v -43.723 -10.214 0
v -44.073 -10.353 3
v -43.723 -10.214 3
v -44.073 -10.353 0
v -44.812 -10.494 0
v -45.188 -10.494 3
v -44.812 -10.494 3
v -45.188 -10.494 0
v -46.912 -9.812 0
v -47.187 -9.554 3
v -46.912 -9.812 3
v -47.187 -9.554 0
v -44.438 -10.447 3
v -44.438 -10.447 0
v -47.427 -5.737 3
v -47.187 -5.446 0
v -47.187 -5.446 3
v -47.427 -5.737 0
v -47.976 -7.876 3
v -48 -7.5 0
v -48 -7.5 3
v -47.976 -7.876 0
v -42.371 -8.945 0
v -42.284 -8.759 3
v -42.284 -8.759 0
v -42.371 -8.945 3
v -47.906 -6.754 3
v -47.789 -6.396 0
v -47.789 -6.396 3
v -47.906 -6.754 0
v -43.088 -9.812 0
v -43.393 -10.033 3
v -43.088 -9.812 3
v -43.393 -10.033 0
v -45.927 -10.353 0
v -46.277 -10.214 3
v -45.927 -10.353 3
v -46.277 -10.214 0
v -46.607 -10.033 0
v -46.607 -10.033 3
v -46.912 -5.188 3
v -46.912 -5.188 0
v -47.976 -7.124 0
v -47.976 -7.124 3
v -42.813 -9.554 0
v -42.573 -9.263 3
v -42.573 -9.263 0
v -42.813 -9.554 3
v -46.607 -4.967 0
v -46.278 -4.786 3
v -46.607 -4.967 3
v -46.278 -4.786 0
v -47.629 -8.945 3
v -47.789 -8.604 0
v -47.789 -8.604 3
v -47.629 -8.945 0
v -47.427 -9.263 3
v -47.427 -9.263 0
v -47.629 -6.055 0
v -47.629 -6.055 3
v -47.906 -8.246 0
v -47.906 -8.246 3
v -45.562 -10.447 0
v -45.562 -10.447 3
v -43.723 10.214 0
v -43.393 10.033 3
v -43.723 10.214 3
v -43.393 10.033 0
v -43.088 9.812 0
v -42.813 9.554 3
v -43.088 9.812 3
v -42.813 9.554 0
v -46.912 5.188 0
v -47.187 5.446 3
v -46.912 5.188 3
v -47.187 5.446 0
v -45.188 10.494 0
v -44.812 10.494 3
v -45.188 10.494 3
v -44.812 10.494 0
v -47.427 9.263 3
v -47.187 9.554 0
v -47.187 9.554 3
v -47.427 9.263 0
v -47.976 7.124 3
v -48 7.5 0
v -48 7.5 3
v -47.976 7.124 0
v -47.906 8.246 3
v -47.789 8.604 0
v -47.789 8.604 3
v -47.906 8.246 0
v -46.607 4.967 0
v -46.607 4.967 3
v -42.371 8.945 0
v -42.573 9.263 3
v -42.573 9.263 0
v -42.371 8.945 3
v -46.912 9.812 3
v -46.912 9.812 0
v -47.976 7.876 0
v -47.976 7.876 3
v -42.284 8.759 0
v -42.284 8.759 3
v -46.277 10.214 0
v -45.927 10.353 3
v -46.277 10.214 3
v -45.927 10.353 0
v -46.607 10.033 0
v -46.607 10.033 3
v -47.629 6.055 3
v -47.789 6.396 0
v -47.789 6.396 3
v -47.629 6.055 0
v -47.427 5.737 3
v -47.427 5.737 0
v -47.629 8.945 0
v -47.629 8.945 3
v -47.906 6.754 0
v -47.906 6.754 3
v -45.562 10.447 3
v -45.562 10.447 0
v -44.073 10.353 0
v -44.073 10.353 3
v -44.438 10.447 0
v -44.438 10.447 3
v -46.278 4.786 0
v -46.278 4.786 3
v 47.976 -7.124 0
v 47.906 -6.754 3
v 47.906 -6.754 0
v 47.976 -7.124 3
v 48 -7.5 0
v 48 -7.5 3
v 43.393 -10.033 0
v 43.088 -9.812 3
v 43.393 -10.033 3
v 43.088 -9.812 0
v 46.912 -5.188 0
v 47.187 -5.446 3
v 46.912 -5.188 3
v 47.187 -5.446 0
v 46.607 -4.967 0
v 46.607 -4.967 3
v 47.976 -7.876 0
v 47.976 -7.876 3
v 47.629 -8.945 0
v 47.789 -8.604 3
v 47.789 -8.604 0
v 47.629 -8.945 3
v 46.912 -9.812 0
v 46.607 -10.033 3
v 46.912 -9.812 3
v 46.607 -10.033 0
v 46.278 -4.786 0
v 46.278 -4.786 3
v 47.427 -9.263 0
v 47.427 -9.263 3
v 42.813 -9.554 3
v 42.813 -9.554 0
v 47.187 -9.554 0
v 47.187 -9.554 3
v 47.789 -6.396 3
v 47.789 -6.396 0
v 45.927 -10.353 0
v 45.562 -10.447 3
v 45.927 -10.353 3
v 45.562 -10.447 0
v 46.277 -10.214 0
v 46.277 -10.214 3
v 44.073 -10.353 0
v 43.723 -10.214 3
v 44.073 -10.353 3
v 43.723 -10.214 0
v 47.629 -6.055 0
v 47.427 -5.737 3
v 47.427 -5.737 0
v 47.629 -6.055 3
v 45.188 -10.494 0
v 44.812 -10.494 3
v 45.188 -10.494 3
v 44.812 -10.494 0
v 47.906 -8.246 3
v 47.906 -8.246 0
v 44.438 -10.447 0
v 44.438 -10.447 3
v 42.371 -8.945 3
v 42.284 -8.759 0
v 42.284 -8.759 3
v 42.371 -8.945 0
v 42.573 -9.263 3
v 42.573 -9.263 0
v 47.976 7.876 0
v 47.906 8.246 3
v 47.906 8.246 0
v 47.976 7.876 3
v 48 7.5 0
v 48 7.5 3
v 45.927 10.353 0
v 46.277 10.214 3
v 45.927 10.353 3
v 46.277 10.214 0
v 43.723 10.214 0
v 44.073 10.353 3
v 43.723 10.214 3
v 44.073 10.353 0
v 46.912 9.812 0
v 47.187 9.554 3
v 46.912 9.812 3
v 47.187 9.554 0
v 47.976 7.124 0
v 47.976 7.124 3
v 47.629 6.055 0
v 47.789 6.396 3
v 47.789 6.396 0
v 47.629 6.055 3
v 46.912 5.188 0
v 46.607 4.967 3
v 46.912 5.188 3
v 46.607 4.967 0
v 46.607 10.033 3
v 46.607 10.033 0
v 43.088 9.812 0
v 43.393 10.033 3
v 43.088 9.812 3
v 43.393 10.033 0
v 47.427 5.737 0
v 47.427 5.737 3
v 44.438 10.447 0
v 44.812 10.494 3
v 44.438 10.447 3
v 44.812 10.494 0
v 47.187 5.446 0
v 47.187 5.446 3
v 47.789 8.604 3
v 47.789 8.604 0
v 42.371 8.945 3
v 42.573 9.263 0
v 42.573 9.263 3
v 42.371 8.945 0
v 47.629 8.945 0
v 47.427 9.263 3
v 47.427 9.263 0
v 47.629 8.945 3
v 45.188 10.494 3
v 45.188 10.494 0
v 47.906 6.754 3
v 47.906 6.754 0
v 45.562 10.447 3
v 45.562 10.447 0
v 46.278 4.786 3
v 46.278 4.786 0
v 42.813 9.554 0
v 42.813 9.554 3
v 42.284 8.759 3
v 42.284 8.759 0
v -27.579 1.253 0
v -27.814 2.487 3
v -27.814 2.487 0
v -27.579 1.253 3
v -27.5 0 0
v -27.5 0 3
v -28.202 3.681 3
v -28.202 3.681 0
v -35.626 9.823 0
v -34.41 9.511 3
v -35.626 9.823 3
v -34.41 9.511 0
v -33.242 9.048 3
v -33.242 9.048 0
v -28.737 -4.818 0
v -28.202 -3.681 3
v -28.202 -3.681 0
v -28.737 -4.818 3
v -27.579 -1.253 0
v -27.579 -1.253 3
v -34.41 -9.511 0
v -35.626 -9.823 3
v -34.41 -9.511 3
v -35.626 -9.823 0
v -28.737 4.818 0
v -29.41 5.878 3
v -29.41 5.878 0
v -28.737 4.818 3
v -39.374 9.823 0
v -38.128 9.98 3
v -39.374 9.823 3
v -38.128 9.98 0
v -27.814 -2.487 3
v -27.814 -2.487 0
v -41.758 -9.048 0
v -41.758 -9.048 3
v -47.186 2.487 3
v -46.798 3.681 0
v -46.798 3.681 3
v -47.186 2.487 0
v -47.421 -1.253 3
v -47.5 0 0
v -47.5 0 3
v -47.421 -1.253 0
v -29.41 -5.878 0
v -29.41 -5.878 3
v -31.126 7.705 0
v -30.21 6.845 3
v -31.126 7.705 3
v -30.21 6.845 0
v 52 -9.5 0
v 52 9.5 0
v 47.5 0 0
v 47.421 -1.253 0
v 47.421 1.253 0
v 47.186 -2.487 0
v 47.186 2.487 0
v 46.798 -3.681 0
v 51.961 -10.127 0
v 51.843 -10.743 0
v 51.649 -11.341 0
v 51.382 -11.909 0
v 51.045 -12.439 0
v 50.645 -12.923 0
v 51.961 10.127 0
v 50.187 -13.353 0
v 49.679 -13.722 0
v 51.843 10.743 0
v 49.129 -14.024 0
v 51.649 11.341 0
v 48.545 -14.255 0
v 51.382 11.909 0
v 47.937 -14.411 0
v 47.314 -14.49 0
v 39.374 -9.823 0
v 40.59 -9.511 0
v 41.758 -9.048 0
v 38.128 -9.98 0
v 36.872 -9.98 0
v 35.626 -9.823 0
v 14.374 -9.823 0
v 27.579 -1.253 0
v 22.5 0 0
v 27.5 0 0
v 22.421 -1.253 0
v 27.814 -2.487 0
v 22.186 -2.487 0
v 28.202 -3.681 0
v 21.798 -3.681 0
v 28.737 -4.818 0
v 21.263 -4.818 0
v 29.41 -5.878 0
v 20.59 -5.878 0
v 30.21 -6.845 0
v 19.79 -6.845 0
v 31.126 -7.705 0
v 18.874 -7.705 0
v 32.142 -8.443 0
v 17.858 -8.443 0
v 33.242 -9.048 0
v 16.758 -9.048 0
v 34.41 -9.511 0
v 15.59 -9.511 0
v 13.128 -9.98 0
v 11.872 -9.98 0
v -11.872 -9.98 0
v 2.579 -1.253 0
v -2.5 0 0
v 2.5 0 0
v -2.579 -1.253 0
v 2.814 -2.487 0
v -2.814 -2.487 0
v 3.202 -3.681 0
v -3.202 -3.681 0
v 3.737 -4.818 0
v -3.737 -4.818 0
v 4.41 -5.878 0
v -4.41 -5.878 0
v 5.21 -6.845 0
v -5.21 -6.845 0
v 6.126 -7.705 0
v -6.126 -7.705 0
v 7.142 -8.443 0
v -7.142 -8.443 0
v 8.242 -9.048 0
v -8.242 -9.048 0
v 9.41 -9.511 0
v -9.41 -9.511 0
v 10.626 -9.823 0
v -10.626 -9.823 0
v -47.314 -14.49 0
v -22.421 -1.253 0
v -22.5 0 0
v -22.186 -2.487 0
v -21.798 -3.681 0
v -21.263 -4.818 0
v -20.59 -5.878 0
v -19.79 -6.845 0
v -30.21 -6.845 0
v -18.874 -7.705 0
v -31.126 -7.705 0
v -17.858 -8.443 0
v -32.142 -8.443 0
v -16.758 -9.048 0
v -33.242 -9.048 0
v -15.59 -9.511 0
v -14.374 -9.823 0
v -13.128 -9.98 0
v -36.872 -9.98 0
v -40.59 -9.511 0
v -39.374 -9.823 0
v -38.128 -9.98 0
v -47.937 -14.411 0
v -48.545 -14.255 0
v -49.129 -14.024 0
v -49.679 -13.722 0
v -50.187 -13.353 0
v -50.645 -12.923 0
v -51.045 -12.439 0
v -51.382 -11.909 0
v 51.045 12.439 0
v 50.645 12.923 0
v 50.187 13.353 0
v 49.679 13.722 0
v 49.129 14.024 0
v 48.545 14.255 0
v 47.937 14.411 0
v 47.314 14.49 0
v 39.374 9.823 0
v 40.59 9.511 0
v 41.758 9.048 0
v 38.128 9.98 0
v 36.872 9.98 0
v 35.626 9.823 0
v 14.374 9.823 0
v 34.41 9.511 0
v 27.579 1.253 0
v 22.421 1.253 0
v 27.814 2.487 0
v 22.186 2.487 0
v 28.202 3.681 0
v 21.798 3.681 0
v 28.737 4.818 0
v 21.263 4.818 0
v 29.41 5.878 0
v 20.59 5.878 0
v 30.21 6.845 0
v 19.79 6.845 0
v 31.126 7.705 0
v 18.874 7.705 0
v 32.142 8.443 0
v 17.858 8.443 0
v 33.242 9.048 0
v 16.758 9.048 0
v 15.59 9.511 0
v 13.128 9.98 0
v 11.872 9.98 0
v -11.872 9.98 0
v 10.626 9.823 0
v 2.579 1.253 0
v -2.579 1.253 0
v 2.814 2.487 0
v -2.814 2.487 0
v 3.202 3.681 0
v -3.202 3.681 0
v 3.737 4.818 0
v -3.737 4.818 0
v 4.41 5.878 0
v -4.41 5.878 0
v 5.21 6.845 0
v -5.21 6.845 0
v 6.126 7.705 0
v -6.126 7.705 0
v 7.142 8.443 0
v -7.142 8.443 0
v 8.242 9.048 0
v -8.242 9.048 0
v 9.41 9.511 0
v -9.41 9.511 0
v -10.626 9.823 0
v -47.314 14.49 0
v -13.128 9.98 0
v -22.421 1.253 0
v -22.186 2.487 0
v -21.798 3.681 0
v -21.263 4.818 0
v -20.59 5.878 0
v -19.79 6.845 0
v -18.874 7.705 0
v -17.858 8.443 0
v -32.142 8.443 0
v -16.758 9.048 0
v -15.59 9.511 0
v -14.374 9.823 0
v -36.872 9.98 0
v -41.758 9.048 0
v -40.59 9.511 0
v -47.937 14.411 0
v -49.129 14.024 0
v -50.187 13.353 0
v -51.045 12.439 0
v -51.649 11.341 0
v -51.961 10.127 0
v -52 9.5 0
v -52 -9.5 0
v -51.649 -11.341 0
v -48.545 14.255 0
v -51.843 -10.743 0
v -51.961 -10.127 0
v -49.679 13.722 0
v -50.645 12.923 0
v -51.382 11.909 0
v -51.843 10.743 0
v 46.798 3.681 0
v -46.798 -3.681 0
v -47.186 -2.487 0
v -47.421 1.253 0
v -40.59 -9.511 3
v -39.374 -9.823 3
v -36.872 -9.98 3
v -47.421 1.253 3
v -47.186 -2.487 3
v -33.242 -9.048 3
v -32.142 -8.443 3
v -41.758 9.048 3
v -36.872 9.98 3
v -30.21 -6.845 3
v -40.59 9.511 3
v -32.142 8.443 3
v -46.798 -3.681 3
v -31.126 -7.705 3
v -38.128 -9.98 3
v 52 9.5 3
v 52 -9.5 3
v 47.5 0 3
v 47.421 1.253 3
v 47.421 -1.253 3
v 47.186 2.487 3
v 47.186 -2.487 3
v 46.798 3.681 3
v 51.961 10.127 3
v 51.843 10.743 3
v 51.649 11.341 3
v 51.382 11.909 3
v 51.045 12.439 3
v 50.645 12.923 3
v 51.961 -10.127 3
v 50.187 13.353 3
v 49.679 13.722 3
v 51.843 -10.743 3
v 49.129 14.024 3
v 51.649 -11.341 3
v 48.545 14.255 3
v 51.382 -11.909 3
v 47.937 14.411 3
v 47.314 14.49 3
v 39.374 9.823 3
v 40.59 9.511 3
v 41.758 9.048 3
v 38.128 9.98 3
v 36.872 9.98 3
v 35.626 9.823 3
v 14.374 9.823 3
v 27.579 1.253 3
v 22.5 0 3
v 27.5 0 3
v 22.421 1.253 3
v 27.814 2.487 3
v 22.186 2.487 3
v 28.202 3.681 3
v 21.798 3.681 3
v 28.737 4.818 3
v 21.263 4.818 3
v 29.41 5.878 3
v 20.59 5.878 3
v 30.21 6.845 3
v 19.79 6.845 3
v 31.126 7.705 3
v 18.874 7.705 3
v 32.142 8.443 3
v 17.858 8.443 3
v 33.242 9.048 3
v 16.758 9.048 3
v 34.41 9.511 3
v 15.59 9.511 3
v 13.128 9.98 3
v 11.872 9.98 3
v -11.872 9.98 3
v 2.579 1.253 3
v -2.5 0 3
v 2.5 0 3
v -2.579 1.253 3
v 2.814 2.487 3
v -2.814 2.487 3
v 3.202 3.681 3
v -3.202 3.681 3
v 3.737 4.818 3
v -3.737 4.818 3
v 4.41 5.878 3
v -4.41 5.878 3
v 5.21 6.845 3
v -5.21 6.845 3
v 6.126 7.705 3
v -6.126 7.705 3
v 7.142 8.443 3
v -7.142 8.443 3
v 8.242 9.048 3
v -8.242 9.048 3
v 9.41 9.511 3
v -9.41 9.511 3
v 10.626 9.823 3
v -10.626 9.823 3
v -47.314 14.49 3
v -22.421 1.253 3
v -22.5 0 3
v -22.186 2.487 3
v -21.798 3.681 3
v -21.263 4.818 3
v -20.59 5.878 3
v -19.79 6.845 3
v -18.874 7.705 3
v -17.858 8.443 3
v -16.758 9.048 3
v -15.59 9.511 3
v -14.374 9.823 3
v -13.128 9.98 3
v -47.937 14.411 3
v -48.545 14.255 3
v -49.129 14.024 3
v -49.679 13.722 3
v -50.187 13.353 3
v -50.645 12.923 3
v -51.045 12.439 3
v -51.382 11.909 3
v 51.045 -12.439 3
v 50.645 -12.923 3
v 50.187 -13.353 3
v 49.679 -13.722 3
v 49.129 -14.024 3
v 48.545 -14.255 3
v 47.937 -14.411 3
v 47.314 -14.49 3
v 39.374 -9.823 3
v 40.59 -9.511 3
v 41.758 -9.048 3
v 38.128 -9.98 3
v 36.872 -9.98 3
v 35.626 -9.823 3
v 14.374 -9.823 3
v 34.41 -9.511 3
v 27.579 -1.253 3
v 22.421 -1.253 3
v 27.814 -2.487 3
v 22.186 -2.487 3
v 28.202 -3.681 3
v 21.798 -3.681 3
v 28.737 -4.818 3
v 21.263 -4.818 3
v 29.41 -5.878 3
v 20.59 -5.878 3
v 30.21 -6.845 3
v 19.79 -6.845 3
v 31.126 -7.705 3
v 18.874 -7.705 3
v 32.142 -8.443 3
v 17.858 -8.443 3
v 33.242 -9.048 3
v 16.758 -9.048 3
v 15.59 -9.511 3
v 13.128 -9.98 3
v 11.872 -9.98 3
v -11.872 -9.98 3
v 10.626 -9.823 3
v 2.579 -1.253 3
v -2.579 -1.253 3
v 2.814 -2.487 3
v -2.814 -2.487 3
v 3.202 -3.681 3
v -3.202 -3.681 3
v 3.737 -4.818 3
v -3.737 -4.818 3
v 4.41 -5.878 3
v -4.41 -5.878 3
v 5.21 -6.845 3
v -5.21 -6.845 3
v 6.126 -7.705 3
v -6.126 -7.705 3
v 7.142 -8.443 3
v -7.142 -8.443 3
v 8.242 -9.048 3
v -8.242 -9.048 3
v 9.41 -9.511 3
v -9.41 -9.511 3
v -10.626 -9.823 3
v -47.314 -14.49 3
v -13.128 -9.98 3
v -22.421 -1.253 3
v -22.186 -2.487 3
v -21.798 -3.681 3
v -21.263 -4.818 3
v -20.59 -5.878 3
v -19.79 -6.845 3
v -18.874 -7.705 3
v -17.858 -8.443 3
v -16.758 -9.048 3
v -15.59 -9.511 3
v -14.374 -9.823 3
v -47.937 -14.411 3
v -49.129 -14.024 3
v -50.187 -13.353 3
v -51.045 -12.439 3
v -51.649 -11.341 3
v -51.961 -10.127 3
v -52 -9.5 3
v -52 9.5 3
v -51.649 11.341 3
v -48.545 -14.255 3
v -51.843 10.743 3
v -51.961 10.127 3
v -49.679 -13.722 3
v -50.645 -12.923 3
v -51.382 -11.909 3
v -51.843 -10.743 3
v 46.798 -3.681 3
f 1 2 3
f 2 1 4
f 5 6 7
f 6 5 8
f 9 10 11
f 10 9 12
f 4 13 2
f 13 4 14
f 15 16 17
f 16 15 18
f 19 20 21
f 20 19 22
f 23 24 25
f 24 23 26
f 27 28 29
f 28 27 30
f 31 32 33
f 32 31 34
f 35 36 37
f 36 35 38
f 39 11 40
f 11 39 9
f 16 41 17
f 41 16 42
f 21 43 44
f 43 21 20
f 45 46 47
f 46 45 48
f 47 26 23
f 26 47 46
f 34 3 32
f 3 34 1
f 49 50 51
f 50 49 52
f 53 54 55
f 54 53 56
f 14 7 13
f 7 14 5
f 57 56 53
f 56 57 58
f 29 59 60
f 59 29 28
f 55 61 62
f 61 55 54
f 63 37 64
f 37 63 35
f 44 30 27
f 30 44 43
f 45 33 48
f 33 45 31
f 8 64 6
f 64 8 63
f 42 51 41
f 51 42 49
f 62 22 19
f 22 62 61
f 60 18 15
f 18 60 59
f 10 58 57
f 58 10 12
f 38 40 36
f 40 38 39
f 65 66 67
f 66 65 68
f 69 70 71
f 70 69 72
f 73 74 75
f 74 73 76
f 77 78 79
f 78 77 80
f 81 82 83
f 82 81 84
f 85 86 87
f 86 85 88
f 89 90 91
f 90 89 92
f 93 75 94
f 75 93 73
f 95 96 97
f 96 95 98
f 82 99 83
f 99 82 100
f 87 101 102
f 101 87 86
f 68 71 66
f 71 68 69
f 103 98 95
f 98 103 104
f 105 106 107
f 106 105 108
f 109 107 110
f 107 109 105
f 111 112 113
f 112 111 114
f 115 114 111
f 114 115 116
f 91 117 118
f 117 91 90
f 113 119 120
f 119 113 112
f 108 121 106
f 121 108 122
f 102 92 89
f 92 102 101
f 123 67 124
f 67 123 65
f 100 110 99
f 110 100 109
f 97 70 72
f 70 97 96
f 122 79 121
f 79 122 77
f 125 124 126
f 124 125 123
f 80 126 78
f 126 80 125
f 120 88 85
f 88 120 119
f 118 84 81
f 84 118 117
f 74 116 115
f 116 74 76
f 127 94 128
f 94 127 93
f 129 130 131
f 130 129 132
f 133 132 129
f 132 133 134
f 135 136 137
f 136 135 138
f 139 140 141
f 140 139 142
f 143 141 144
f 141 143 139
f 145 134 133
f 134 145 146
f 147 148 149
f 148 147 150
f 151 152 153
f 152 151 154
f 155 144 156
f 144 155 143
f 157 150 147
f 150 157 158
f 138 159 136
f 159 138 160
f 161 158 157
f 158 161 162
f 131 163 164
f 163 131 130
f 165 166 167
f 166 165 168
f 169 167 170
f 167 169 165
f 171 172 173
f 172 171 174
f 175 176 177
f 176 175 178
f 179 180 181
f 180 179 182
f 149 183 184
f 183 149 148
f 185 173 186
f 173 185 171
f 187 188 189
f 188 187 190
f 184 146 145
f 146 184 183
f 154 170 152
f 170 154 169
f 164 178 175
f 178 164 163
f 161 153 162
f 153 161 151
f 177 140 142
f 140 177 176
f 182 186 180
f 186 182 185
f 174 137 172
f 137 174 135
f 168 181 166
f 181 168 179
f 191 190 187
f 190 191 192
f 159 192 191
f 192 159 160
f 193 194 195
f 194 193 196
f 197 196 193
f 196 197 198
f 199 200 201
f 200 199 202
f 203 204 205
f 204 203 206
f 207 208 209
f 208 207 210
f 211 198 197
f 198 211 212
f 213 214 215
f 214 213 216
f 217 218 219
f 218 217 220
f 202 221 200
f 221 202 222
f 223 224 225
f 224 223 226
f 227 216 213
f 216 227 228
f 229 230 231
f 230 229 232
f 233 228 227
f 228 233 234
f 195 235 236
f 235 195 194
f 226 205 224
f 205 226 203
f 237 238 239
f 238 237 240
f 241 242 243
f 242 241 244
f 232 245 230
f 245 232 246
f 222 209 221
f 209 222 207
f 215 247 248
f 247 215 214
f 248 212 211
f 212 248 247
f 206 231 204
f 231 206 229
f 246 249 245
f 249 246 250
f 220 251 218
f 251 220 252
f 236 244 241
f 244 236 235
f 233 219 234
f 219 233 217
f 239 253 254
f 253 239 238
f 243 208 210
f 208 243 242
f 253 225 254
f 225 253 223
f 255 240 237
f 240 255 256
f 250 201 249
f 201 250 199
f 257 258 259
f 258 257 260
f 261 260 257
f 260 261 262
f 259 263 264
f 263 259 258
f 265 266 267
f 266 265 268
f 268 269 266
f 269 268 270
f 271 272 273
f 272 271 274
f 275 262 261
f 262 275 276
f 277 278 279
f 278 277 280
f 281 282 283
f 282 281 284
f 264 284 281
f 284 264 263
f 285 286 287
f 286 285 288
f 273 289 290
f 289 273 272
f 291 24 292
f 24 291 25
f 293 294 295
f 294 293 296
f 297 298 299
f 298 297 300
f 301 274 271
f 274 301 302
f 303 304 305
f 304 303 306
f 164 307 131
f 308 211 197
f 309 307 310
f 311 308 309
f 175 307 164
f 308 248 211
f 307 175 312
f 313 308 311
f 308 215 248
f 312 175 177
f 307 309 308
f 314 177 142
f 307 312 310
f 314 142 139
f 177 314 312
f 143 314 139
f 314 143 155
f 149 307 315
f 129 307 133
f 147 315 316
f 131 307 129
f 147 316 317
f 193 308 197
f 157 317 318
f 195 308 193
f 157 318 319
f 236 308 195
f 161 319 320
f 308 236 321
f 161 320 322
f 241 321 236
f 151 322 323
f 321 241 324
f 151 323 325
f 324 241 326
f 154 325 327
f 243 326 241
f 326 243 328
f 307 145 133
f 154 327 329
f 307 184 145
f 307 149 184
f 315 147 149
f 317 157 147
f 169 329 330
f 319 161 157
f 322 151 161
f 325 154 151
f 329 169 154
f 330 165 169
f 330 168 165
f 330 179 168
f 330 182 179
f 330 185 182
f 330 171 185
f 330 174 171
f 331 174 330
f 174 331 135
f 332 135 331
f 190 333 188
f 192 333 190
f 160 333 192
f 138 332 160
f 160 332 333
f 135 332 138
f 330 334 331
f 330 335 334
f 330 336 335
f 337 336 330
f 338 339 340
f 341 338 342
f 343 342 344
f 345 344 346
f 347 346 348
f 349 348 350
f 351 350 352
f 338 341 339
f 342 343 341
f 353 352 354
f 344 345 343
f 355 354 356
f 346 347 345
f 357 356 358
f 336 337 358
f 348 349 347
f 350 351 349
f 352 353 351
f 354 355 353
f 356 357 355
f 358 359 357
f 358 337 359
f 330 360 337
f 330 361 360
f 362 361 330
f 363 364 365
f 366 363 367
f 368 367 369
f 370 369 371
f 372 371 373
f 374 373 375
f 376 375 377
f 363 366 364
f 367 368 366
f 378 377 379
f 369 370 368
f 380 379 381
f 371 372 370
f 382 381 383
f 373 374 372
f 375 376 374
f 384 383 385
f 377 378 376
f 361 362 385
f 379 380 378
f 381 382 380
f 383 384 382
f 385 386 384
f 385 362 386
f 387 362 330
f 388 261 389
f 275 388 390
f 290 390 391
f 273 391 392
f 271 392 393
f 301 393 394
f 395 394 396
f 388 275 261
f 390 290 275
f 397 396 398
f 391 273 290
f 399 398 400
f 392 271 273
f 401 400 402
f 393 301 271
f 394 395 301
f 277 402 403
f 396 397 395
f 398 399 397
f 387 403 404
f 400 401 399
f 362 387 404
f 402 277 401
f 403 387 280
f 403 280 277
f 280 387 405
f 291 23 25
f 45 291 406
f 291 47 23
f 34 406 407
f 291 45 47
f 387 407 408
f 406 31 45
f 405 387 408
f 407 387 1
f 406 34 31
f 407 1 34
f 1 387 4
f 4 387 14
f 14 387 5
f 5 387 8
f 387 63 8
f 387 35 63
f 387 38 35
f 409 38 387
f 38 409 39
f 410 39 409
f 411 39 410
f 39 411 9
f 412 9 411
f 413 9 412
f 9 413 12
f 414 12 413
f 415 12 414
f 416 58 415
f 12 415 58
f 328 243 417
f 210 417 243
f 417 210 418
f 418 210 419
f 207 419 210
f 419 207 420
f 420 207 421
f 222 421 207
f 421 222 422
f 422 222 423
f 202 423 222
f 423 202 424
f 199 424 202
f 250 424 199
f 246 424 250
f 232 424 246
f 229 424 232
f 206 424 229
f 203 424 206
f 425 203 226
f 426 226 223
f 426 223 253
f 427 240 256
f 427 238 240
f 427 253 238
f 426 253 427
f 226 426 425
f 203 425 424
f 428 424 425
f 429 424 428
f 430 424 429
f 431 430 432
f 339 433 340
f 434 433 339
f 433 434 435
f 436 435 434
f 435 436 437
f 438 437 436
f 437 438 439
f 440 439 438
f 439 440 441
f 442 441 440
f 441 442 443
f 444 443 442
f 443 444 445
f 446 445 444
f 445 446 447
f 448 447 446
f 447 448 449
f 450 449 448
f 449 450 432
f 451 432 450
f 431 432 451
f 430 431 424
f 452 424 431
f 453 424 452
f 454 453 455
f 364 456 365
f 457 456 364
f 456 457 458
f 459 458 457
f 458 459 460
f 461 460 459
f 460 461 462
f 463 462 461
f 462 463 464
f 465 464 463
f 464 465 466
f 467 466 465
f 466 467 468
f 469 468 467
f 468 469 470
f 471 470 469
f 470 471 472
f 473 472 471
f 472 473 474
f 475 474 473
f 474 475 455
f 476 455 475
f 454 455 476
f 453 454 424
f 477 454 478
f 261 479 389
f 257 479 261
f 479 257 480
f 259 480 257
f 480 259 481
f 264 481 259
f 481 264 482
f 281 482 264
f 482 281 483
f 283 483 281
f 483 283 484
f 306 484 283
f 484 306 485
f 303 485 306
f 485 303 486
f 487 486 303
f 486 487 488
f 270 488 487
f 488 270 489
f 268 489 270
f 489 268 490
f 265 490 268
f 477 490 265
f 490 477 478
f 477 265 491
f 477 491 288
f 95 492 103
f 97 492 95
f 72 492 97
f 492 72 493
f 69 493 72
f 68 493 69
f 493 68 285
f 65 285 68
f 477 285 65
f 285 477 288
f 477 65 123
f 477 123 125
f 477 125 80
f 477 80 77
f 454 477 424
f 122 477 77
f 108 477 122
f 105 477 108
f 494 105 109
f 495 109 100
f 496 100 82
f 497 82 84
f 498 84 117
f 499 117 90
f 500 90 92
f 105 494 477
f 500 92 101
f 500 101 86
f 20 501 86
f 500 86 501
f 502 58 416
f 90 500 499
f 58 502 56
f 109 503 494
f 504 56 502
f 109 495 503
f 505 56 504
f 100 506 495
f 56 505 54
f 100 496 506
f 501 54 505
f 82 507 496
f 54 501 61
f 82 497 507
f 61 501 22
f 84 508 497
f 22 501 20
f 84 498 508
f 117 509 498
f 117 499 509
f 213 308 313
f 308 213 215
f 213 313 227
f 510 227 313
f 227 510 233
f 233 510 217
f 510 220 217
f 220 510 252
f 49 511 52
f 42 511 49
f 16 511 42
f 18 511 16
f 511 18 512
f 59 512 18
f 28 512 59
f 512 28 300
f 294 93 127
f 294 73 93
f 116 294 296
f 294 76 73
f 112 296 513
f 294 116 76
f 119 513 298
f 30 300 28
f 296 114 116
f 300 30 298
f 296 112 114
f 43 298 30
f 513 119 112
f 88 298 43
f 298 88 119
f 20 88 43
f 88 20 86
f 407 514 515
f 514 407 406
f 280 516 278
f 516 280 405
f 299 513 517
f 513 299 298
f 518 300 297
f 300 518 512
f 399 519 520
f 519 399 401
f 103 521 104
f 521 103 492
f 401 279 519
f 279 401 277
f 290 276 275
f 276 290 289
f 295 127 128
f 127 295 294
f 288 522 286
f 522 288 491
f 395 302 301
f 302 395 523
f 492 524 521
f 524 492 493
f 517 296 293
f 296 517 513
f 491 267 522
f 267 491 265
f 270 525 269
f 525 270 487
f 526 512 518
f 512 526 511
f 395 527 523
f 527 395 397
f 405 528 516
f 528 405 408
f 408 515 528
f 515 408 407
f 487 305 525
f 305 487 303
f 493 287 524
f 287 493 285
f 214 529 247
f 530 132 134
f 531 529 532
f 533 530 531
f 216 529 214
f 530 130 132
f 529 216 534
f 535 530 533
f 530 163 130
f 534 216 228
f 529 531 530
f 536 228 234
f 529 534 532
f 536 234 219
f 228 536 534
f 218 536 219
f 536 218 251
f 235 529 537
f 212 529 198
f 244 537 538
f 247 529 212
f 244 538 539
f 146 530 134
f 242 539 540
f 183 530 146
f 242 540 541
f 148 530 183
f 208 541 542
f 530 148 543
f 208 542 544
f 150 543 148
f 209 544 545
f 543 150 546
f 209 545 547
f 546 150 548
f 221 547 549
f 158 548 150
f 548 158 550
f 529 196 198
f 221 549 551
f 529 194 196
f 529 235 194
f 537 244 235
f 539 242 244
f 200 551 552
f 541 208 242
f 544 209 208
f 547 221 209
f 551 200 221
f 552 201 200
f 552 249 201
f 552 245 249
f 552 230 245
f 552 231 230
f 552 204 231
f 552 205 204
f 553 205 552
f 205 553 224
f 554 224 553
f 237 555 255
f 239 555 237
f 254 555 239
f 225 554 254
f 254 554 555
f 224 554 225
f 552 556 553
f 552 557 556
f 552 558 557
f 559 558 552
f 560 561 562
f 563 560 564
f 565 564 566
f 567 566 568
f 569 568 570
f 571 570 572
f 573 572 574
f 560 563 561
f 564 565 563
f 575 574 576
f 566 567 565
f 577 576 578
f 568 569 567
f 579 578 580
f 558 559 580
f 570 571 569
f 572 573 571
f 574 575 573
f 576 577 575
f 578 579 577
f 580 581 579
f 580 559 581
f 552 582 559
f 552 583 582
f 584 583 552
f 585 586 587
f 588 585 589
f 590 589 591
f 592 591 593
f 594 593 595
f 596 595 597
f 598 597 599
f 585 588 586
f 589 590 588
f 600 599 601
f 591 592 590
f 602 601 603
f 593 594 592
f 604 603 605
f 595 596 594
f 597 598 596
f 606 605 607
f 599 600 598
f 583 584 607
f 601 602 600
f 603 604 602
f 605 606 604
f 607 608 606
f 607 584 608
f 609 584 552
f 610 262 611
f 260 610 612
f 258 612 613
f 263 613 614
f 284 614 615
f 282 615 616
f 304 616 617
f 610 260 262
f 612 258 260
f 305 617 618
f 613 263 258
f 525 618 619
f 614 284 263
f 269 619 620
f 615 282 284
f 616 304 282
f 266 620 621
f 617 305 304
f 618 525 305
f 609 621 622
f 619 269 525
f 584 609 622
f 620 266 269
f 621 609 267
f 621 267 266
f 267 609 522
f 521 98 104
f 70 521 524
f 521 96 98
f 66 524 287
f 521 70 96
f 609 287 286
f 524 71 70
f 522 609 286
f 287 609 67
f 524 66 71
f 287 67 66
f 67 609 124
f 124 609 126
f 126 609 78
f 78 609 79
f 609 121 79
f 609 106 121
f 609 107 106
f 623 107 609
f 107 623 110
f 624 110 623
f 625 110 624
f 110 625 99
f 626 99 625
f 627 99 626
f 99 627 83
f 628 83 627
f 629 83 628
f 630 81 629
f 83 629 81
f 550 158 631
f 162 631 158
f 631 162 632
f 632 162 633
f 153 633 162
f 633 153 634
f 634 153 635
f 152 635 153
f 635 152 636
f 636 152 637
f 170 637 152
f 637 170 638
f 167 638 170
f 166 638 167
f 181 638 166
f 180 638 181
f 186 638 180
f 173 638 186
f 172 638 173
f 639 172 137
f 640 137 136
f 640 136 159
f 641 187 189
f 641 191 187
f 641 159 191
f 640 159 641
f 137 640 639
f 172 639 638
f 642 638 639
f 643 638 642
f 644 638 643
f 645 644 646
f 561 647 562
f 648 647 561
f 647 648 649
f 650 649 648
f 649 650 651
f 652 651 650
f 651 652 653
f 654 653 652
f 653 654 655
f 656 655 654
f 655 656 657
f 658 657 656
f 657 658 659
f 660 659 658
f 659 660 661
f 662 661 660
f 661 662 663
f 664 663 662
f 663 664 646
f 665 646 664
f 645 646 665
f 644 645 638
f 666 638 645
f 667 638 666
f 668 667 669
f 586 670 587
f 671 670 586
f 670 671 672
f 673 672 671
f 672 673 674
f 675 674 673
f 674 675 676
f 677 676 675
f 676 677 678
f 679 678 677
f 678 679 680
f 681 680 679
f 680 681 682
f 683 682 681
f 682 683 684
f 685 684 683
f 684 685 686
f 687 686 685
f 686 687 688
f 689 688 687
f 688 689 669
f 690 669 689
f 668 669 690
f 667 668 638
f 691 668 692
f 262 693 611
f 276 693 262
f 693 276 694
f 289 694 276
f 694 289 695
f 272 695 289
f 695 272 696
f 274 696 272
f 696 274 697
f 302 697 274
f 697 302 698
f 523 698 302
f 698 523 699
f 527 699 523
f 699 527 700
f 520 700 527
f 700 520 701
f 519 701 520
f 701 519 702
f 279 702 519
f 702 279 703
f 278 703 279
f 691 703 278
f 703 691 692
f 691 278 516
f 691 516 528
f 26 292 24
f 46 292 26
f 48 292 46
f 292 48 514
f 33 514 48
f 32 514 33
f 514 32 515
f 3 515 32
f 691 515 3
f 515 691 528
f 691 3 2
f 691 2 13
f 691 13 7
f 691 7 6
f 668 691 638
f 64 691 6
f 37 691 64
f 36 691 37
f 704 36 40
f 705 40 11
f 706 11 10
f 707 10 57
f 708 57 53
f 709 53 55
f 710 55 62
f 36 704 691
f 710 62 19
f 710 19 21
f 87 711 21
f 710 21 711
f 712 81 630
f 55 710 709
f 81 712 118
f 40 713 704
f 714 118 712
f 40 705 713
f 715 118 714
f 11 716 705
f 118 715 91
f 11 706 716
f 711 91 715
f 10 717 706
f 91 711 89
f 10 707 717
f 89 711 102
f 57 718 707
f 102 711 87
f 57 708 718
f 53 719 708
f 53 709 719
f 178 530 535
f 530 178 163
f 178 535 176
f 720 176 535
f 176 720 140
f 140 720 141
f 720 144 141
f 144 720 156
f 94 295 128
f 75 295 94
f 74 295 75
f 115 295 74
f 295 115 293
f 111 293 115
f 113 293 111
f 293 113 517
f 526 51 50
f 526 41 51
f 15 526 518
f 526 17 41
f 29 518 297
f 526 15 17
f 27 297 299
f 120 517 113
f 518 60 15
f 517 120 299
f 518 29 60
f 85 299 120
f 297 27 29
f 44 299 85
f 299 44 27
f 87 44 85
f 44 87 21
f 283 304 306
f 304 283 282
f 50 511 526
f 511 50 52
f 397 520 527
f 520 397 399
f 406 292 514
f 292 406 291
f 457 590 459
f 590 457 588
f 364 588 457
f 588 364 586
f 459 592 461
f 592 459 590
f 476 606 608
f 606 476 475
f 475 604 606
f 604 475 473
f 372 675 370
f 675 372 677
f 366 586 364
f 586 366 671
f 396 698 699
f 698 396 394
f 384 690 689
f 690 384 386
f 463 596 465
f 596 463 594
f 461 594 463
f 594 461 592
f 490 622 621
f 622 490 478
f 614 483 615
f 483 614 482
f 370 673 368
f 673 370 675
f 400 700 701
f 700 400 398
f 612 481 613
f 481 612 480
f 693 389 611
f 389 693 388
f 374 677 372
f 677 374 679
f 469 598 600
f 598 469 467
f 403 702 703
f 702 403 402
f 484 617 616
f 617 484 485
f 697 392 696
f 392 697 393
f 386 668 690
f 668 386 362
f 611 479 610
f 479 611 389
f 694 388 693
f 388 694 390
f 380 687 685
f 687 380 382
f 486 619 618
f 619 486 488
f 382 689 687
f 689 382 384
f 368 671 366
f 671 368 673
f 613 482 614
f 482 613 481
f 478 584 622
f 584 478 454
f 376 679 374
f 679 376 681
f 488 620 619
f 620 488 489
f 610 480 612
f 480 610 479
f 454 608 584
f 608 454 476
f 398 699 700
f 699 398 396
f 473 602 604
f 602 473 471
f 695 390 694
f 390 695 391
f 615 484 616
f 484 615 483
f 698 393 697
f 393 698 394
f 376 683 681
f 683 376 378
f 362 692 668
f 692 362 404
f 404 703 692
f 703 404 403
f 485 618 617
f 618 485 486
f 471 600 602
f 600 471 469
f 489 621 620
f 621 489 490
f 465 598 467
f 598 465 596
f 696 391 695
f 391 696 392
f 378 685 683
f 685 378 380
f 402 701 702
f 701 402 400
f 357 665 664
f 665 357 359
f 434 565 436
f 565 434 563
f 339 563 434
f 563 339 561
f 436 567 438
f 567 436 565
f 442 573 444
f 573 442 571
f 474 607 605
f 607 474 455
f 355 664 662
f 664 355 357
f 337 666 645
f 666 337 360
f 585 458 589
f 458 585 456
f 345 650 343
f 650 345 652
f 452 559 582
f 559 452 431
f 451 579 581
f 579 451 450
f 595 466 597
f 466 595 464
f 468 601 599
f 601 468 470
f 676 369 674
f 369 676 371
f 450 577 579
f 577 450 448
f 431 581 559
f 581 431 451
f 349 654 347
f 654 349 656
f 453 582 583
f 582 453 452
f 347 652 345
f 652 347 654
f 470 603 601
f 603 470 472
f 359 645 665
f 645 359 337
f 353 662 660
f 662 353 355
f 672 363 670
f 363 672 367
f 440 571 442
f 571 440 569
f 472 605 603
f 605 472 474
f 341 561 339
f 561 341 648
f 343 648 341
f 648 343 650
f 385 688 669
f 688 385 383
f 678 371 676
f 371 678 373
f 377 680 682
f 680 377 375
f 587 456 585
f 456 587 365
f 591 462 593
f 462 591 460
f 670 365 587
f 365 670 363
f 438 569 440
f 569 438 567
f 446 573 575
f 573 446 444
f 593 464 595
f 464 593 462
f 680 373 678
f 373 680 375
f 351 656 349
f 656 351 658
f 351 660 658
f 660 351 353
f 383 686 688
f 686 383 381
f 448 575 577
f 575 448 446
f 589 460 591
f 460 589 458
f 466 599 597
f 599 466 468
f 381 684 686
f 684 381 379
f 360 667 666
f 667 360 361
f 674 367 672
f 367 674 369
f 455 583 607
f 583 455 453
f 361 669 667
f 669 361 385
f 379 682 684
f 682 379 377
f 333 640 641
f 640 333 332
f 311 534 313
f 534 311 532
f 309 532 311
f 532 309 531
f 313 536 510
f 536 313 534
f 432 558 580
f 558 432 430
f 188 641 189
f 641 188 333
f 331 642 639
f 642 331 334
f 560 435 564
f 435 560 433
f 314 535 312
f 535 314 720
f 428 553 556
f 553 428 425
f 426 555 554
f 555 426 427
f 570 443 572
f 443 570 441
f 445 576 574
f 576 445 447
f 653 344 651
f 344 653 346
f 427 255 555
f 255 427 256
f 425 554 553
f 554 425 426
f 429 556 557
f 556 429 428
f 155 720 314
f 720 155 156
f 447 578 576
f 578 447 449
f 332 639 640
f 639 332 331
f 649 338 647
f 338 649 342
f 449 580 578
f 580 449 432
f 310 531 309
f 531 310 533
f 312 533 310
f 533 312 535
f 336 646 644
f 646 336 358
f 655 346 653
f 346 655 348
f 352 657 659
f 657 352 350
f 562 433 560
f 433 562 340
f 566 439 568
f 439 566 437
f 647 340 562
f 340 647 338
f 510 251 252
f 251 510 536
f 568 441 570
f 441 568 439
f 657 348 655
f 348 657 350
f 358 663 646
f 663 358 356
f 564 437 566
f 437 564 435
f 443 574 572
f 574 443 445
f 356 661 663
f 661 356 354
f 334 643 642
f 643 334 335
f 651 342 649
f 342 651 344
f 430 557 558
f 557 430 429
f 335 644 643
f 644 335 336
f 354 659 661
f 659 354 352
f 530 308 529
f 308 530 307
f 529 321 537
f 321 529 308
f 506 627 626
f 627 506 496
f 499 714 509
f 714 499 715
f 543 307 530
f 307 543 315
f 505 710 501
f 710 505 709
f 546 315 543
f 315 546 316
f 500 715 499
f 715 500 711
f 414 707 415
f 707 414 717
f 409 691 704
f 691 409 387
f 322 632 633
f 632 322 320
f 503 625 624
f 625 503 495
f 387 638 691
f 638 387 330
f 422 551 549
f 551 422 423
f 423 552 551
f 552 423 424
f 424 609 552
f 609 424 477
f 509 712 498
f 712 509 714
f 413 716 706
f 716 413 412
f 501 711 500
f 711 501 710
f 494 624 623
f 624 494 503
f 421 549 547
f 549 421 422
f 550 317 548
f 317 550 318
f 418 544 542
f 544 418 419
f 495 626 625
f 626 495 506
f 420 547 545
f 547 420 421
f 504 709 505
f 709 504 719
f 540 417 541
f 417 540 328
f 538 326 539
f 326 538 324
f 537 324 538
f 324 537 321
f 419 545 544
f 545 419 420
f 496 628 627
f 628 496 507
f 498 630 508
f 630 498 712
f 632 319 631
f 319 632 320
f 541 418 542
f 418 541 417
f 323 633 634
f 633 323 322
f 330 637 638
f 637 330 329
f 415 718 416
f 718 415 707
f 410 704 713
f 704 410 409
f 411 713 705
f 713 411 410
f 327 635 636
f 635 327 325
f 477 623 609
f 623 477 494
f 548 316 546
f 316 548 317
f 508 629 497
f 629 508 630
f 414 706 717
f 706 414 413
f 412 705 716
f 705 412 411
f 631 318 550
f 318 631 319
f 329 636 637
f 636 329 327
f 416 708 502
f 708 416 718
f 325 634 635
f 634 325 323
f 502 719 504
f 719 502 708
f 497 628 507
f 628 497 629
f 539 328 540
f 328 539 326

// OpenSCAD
$fn = 50;


difference() {
	union() {
		hull() {
			translate(v = [-47.0000000000, 9.5000000000, 0]) {
				cylinder(h = 3, r = 5);
			}
			translate(v = [47.0000000000, 9.5000000000, 0]) {
				cylinder(h = 3, r = 5);
			}
			translate(v = [-47.0000000000, -9.5000000000, 0]) {
				cylinder(h = 3, r = 5);
			}
			translate(v = [47.0000000000, -9.5000000000, 0]) {
				cylinder(h = 3, r = 5);
			}
		}
	}
	union() {
		#translate(v = [-45.0000000000, -7.5000000000, -100.0000000000]) {
			cylinder(h = 200, r = 3.0000000000);
		}
		#translate(v = [-45.0000000000, 7.5000000000, -100.0000000000]) {
			cylinder(h = 200, r = 3.0000000000);
		}
		#translate(v = [45.0000000000, -7.5000000000, -100.0000000000]) {
			cylinder(h = 200, r = 3.0000000000);
		}
		#translate(v = [45.0000000000, 7.5000000000, -100.0000000000]) {
			cylinder(h = 200, r = 3.0000000000);
		}
		#translate(v = [-37.5000000000, 0, 0]) {
			cylinder(h = 3, r = 10.0000000000);
		}
		#translate(v = [-12.5000000000, 0, 0]) {
			cylinder(h = 3, r = 10.0000000000);
		}
		#translate(v = [12.5000000000, 0, 0]) {
			cylinder(h = 3, r = 10.0000000000);
		}
		#translate(v = [37.5000000000, 0, 0]) {
			cylinder(h = 3, r = 10.0000000000);
		}
	}
}
